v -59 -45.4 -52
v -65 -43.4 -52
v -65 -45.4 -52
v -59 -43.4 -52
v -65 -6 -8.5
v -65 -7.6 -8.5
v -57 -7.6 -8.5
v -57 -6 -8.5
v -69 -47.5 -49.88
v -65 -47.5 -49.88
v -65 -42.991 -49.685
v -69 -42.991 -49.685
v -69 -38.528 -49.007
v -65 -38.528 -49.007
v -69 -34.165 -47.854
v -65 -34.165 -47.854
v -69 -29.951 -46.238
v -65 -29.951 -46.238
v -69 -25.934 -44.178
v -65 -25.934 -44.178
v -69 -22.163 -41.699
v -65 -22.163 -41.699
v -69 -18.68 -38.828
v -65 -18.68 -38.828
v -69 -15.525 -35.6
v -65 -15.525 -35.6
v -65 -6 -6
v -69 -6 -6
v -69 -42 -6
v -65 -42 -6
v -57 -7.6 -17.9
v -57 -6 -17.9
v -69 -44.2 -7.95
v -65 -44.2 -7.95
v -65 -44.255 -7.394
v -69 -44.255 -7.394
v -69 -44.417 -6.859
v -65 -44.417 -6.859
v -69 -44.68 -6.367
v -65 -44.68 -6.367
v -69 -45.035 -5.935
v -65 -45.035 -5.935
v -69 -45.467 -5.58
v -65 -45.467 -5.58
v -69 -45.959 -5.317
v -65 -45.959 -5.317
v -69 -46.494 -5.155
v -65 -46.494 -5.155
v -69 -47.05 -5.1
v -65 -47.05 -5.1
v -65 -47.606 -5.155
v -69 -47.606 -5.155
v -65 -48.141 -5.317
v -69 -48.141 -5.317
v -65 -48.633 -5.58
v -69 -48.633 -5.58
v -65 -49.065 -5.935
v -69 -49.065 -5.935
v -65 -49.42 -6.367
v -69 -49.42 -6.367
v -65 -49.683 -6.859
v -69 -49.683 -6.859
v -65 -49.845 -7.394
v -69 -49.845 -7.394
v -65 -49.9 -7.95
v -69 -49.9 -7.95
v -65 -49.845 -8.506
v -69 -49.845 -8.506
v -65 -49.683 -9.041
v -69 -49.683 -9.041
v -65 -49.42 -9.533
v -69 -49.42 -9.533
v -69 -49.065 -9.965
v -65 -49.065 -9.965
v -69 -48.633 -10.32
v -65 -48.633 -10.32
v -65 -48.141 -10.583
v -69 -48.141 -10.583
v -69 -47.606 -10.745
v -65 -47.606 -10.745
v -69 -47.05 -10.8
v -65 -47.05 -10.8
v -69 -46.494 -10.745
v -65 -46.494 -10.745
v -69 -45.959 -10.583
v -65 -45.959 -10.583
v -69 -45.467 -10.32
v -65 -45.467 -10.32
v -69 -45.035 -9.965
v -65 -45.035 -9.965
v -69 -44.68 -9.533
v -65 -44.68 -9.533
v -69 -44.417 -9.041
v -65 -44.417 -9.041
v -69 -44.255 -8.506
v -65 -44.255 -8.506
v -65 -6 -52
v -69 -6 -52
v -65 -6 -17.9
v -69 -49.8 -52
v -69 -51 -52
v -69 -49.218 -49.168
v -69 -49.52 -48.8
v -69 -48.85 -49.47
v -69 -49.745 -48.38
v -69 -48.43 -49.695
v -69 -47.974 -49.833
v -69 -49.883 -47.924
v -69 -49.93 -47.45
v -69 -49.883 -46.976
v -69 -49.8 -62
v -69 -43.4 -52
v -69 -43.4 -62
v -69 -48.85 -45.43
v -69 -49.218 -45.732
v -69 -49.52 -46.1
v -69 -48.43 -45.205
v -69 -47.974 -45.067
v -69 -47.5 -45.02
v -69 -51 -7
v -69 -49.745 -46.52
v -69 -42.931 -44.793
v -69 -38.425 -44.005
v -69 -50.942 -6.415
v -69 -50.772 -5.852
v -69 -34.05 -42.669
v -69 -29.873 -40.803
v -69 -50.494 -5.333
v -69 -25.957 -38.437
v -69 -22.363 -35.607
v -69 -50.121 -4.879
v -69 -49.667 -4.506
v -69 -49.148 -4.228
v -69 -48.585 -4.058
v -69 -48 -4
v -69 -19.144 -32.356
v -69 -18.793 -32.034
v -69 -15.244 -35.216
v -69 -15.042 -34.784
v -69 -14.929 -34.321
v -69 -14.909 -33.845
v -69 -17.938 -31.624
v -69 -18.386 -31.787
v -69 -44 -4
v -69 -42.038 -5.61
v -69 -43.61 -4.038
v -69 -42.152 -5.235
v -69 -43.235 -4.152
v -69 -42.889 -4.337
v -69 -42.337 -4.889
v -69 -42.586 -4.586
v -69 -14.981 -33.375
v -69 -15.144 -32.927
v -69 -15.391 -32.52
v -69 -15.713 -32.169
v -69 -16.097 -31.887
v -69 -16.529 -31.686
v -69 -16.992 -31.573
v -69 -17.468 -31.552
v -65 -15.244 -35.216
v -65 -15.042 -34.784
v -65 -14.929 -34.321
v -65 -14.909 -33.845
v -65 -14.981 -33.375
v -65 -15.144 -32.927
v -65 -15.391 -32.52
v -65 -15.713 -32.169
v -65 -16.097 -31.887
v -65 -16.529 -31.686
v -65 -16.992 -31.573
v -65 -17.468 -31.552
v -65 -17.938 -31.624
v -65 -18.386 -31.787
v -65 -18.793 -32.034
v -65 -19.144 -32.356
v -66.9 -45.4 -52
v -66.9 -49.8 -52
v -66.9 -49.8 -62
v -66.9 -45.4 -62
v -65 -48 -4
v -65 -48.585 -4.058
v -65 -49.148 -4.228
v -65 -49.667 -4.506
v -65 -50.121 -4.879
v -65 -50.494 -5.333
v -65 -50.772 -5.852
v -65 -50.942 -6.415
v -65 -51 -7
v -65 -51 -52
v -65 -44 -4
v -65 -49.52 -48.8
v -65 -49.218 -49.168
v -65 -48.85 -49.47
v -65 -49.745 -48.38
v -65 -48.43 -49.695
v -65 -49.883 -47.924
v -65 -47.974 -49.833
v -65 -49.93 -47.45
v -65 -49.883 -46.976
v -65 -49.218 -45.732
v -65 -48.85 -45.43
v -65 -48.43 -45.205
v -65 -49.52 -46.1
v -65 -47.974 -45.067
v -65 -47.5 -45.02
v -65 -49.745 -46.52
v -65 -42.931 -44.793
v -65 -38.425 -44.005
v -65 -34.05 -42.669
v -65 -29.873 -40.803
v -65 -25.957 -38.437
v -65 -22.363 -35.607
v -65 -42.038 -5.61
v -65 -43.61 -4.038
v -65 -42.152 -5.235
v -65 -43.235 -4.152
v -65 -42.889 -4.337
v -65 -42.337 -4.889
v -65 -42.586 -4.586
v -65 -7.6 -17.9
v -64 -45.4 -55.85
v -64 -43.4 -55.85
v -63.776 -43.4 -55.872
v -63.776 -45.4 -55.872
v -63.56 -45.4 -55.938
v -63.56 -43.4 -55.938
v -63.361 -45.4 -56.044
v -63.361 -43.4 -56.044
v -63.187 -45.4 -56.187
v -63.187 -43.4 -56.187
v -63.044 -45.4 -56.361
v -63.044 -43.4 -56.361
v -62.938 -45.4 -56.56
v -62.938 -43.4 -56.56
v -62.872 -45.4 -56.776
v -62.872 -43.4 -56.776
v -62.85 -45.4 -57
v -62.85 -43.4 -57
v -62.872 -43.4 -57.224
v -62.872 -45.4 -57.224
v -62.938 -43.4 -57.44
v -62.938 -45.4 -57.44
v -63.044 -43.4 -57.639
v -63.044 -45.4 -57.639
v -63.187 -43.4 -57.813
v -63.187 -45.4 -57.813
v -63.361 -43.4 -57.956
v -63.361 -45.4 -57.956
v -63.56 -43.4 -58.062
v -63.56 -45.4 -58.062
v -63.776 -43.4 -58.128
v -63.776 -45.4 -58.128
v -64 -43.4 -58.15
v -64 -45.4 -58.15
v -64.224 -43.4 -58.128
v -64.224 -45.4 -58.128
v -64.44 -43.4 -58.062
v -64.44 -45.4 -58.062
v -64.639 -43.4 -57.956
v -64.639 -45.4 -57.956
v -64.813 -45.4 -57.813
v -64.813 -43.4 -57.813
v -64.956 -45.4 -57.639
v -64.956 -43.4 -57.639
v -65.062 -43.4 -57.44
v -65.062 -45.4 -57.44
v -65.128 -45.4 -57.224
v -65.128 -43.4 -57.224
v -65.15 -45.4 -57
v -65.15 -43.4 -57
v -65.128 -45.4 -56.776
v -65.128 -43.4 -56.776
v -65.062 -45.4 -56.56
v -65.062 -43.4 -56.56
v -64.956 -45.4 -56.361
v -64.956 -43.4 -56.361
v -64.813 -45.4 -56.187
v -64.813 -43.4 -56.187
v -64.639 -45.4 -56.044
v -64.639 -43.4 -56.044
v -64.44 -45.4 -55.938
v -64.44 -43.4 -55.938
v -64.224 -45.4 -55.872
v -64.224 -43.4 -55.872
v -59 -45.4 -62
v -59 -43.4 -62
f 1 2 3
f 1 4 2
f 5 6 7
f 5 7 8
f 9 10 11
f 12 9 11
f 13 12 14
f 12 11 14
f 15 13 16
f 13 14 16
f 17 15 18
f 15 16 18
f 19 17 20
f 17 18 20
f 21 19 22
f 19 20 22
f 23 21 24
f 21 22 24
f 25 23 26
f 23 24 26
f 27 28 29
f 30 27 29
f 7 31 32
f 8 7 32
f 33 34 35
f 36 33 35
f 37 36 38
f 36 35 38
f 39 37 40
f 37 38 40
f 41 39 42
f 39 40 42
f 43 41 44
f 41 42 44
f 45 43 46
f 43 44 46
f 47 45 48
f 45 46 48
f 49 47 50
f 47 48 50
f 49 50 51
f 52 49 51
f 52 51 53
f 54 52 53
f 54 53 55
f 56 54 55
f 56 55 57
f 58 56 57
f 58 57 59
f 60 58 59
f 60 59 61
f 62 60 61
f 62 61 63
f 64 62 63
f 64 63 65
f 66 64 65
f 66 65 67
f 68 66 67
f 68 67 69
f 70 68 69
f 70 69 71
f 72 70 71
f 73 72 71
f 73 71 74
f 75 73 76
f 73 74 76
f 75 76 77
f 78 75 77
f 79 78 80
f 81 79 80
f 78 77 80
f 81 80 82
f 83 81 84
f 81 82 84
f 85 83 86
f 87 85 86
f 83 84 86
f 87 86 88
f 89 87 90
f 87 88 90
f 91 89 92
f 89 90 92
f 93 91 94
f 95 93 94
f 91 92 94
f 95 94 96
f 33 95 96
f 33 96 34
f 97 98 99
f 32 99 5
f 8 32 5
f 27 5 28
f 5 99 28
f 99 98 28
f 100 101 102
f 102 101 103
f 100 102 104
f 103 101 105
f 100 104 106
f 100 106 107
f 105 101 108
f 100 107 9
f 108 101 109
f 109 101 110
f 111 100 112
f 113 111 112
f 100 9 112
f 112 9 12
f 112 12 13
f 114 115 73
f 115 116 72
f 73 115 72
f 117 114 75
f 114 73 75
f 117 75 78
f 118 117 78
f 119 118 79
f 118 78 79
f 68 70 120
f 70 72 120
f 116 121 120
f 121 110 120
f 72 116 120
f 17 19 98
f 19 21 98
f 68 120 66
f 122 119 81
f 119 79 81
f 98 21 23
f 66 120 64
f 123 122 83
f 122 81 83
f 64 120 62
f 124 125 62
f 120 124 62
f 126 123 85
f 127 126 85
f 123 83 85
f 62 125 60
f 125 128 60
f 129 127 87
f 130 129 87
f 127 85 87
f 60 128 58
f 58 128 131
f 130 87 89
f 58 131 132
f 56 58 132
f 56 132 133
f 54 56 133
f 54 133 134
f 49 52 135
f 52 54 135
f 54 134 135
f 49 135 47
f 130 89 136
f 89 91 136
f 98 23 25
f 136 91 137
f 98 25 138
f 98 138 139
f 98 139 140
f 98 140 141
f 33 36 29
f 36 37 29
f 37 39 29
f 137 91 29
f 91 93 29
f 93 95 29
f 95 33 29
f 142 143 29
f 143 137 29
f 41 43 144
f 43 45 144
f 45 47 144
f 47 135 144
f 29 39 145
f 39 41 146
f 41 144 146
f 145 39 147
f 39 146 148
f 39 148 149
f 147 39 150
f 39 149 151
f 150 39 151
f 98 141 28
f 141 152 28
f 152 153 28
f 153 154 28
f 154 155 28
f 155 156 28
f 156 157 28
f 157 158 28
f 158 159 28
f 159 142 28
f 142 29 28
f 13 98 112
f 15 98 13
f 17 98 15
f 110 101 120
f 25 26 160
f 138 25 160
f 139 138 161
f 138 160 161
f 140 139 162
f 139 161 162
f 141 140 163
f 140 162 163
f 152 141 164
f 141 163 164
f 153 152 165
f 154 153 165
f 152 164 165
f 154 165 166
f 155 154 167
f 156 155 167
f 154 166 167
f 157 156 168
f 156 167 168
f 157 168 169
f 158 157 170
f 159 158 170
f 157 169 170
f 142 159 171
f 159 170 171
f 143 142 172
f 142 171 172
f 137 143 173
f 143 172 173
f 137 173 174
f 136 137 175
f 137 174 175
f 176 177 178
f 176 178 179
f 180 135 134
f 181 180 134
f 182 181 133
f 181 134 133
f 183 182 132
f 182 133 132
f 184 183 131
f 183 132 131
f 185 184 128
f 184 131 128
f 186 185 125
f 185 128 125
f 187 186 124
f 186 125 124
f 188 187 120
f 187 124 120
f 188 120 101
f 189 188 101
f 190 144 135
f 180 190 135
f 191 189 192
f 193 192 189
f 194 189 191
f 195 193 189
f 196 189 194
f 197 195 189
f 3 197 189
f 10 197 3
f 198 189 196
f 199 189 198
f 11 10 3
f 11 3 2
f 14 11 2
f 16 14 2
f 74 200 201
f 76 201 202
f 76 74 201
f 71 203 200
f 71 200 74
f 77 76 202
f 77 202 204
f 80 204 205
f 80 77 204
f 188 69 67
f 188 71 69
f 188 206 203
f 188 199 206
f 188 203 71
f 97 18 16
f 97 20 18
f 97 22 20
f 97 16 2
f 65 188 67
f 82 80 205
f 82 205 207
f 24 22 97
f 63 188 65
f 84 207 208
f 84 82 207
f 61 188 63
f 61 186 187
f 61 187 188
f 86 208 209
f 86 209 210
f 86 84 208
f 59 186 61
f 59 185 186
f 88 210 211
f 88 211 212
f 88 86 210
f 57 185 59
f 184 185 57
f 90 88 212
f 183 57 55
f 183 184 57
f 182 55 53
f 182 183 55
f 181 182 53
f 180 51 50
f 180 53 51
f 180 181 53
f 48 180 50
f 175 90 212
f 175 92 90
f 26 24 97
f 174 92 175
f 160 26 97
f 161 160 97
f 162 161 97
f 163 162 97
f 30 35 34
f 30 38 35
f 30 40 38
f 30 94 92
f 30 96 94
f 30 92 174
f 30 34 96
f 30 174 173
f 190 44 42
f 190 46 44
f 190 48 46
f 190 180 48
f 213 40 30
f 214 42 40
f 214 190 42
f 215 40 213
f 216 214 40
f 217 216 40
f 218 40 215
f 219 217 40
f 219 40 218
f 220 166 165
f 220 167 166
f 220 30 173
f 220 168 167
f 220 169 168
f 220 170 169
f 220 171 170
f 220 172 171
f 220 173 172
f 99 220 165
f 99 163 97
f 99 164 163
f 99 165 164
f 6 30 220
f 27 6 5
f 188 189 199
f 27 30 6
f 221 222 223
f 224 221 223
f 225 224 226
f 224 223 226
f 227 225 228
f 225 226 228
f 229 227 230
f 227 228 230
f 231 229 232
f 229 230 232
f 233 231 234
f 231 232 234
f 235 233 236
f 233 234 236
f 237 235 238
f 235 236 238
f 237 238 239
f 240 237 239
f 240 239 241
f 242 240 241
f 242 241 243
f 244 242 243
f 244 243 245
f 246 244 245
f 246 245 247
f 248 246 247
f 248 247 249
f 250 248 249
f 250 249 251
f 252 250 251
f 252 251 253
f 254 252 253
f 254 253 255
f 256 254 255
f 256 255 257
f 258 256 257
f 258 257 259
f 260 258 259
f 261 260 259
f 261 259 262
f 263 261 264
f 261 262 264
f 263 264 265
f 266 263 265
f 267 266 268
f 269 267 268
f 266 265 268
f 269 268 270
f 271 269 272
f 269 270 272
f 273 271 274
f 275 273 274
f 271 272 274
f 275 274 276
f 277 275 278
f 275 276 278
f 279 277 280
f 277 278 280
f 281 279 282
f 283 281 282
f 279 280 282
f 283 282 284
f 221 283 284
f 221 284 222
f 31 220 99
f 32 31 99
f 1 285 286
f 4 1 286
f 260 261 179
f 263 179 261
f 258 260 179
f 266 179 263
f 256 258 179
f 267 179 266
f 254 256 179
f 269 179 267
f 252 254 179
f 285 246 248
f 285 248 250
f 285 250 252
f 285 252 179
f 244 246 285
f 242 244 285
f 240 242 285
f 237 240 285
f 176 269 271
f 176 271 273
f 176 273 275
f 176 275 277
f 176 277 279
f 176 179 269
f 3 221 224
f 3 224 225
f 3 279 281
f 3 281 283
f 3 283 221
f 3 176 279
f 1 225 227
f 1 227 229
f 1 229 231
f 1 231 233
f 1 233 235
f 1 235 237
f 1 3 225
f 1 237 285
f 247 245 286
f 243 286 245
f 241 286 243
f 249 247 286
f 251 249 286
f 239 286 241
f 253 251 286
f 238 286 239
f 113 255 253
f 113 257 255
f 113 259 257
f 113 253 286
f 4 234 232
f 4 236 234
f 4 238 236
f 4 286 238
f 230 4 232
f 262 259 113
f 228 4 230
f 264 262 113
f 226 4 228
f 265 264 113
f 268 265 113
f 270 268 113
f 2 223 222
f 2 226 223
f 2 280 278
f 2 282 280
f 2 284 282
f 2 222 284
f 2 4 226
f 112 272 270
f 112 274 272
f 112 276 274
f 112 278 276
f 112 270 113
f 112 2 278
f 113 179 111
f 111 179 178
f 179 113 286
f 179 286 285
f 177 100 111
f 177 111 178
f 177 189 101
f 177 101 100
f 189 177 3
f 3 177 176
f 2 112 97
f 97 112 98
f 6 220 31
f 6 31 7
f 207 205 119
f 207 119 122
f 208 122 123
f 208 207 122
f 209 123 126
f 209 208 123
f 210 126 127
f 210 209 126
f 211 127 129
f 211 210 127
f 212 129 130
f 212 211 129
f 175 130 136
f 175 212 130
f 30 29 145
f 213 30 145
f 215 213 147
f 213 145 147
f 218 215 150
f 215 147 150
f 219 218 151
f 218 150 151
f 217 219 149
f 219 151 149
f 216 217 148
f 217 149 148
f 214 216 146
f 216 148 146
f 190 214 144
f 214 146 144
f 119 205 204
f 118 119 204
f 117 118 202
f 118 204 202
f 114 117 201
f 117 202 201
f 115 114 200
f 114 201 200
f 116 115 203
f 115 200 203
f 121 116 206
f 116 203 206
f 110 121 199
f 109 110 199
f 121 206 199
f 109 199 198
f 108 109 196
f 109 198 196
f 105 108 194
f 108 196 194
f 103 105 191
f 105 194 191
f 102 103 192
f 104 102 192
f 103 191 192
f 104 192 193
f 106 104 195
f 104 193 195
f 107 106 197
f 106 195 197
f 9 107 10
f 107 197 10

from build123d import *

# Parameters (mm, degrees)
PAD046_DEPTH    = 4
SKETCH079_R     = 2.85
POCKET030_DEPTH = 5
PAD047_DEPTH    = 10
SKETCH081_R     = 1.15
POCKET031_DEPTH = 5
SKETCH096_W     = 1.6
SKETCH096_H     = 9.4
PAD058_DEPTH    = 8


with BuildPart() as part:
    # Sketch078 → Pad046 (new body)
    with BuildSketch(Plane.YZ):
        with BuildLine():
            Line((0, -13), (45, -13))
            Line((45, -13), (45, 33))
            Line((45, 33), (9, 33))
            ThreePointArc((9, 33), (8.414214, 34.414214), (7, 35))
            Line((7, 35), (3, 35))
            ThreePointArc((3, 35), (0.87868, 34.12132), (0, 32))
            Line((0, 32), (0, -13))
        make_face()
    extrude(amount=PAD046_DEPTH)

    # Sketch079 (on Face9 of Pad046) → Pocket030 (cut)
    with BuildSketch(Plane.YZ.offset(4)):
        with Locations((3.95, 31.05)):
            Circle(SKETCH079_R)
        with BuildLine():
            ThreePointArc((3.5, -6.02), (1.07, -8.45), (3.5, -10.88))
            ThreePointArc((3.5, -10.88), (21.049368, -7.237583), (35.474671, 3.4))
            ThreePointArc((35.474671, 3.4), (35.286946, 6.831408), (31.855538, 6.643683))
            ThreePointArc((3.5, -6.02), (19.067667, -2.800311), (31.855538, 6.643683))
        make_face()
    extrude(amount=-POCKET030_DEPTH, mode=Mode.SUBTRACT)

    # Sketch080 (on Face1 of Pocket030) → Pad047 (join)
    with BuildSketch(Plane.YX.offset(13)):
        Polygon((1.2, 2.1), (5.6, 2.1), (5.6, 10), (7.6, 10), (7.6, 0), (5.6, 0), (1.2, 0), align=None)
    extrude(amount=PAD047_DEPTH)

    # Sketch081 (on Face21 of Pad047) → Pocket031 (cut)
    with BuildSketch(Plane.ZX.offset(7.6)):
        with Locations((-18, 5)):
            Circle(SKETCH081_R)
    extrude(amount=-POCKET031_DEPTH, mode=Mode.SUBTRACT)

    # Sketch096 (on Face6 of Pocket031) → Pad058 (join)
    with BuildSketch(Plane.YZ.offset(4)):
        with Locations((44.2, 25.8)):
            Rectangle(SKETCH096_W, SKETCH096_H)
    extrude(amount=PAD058_DEPTH)


with BuildPart() as part_1:
    # Body019 placement: moved
    add(part.part.moved(Location((-69, -51, -39))))


solid = part_1.part
